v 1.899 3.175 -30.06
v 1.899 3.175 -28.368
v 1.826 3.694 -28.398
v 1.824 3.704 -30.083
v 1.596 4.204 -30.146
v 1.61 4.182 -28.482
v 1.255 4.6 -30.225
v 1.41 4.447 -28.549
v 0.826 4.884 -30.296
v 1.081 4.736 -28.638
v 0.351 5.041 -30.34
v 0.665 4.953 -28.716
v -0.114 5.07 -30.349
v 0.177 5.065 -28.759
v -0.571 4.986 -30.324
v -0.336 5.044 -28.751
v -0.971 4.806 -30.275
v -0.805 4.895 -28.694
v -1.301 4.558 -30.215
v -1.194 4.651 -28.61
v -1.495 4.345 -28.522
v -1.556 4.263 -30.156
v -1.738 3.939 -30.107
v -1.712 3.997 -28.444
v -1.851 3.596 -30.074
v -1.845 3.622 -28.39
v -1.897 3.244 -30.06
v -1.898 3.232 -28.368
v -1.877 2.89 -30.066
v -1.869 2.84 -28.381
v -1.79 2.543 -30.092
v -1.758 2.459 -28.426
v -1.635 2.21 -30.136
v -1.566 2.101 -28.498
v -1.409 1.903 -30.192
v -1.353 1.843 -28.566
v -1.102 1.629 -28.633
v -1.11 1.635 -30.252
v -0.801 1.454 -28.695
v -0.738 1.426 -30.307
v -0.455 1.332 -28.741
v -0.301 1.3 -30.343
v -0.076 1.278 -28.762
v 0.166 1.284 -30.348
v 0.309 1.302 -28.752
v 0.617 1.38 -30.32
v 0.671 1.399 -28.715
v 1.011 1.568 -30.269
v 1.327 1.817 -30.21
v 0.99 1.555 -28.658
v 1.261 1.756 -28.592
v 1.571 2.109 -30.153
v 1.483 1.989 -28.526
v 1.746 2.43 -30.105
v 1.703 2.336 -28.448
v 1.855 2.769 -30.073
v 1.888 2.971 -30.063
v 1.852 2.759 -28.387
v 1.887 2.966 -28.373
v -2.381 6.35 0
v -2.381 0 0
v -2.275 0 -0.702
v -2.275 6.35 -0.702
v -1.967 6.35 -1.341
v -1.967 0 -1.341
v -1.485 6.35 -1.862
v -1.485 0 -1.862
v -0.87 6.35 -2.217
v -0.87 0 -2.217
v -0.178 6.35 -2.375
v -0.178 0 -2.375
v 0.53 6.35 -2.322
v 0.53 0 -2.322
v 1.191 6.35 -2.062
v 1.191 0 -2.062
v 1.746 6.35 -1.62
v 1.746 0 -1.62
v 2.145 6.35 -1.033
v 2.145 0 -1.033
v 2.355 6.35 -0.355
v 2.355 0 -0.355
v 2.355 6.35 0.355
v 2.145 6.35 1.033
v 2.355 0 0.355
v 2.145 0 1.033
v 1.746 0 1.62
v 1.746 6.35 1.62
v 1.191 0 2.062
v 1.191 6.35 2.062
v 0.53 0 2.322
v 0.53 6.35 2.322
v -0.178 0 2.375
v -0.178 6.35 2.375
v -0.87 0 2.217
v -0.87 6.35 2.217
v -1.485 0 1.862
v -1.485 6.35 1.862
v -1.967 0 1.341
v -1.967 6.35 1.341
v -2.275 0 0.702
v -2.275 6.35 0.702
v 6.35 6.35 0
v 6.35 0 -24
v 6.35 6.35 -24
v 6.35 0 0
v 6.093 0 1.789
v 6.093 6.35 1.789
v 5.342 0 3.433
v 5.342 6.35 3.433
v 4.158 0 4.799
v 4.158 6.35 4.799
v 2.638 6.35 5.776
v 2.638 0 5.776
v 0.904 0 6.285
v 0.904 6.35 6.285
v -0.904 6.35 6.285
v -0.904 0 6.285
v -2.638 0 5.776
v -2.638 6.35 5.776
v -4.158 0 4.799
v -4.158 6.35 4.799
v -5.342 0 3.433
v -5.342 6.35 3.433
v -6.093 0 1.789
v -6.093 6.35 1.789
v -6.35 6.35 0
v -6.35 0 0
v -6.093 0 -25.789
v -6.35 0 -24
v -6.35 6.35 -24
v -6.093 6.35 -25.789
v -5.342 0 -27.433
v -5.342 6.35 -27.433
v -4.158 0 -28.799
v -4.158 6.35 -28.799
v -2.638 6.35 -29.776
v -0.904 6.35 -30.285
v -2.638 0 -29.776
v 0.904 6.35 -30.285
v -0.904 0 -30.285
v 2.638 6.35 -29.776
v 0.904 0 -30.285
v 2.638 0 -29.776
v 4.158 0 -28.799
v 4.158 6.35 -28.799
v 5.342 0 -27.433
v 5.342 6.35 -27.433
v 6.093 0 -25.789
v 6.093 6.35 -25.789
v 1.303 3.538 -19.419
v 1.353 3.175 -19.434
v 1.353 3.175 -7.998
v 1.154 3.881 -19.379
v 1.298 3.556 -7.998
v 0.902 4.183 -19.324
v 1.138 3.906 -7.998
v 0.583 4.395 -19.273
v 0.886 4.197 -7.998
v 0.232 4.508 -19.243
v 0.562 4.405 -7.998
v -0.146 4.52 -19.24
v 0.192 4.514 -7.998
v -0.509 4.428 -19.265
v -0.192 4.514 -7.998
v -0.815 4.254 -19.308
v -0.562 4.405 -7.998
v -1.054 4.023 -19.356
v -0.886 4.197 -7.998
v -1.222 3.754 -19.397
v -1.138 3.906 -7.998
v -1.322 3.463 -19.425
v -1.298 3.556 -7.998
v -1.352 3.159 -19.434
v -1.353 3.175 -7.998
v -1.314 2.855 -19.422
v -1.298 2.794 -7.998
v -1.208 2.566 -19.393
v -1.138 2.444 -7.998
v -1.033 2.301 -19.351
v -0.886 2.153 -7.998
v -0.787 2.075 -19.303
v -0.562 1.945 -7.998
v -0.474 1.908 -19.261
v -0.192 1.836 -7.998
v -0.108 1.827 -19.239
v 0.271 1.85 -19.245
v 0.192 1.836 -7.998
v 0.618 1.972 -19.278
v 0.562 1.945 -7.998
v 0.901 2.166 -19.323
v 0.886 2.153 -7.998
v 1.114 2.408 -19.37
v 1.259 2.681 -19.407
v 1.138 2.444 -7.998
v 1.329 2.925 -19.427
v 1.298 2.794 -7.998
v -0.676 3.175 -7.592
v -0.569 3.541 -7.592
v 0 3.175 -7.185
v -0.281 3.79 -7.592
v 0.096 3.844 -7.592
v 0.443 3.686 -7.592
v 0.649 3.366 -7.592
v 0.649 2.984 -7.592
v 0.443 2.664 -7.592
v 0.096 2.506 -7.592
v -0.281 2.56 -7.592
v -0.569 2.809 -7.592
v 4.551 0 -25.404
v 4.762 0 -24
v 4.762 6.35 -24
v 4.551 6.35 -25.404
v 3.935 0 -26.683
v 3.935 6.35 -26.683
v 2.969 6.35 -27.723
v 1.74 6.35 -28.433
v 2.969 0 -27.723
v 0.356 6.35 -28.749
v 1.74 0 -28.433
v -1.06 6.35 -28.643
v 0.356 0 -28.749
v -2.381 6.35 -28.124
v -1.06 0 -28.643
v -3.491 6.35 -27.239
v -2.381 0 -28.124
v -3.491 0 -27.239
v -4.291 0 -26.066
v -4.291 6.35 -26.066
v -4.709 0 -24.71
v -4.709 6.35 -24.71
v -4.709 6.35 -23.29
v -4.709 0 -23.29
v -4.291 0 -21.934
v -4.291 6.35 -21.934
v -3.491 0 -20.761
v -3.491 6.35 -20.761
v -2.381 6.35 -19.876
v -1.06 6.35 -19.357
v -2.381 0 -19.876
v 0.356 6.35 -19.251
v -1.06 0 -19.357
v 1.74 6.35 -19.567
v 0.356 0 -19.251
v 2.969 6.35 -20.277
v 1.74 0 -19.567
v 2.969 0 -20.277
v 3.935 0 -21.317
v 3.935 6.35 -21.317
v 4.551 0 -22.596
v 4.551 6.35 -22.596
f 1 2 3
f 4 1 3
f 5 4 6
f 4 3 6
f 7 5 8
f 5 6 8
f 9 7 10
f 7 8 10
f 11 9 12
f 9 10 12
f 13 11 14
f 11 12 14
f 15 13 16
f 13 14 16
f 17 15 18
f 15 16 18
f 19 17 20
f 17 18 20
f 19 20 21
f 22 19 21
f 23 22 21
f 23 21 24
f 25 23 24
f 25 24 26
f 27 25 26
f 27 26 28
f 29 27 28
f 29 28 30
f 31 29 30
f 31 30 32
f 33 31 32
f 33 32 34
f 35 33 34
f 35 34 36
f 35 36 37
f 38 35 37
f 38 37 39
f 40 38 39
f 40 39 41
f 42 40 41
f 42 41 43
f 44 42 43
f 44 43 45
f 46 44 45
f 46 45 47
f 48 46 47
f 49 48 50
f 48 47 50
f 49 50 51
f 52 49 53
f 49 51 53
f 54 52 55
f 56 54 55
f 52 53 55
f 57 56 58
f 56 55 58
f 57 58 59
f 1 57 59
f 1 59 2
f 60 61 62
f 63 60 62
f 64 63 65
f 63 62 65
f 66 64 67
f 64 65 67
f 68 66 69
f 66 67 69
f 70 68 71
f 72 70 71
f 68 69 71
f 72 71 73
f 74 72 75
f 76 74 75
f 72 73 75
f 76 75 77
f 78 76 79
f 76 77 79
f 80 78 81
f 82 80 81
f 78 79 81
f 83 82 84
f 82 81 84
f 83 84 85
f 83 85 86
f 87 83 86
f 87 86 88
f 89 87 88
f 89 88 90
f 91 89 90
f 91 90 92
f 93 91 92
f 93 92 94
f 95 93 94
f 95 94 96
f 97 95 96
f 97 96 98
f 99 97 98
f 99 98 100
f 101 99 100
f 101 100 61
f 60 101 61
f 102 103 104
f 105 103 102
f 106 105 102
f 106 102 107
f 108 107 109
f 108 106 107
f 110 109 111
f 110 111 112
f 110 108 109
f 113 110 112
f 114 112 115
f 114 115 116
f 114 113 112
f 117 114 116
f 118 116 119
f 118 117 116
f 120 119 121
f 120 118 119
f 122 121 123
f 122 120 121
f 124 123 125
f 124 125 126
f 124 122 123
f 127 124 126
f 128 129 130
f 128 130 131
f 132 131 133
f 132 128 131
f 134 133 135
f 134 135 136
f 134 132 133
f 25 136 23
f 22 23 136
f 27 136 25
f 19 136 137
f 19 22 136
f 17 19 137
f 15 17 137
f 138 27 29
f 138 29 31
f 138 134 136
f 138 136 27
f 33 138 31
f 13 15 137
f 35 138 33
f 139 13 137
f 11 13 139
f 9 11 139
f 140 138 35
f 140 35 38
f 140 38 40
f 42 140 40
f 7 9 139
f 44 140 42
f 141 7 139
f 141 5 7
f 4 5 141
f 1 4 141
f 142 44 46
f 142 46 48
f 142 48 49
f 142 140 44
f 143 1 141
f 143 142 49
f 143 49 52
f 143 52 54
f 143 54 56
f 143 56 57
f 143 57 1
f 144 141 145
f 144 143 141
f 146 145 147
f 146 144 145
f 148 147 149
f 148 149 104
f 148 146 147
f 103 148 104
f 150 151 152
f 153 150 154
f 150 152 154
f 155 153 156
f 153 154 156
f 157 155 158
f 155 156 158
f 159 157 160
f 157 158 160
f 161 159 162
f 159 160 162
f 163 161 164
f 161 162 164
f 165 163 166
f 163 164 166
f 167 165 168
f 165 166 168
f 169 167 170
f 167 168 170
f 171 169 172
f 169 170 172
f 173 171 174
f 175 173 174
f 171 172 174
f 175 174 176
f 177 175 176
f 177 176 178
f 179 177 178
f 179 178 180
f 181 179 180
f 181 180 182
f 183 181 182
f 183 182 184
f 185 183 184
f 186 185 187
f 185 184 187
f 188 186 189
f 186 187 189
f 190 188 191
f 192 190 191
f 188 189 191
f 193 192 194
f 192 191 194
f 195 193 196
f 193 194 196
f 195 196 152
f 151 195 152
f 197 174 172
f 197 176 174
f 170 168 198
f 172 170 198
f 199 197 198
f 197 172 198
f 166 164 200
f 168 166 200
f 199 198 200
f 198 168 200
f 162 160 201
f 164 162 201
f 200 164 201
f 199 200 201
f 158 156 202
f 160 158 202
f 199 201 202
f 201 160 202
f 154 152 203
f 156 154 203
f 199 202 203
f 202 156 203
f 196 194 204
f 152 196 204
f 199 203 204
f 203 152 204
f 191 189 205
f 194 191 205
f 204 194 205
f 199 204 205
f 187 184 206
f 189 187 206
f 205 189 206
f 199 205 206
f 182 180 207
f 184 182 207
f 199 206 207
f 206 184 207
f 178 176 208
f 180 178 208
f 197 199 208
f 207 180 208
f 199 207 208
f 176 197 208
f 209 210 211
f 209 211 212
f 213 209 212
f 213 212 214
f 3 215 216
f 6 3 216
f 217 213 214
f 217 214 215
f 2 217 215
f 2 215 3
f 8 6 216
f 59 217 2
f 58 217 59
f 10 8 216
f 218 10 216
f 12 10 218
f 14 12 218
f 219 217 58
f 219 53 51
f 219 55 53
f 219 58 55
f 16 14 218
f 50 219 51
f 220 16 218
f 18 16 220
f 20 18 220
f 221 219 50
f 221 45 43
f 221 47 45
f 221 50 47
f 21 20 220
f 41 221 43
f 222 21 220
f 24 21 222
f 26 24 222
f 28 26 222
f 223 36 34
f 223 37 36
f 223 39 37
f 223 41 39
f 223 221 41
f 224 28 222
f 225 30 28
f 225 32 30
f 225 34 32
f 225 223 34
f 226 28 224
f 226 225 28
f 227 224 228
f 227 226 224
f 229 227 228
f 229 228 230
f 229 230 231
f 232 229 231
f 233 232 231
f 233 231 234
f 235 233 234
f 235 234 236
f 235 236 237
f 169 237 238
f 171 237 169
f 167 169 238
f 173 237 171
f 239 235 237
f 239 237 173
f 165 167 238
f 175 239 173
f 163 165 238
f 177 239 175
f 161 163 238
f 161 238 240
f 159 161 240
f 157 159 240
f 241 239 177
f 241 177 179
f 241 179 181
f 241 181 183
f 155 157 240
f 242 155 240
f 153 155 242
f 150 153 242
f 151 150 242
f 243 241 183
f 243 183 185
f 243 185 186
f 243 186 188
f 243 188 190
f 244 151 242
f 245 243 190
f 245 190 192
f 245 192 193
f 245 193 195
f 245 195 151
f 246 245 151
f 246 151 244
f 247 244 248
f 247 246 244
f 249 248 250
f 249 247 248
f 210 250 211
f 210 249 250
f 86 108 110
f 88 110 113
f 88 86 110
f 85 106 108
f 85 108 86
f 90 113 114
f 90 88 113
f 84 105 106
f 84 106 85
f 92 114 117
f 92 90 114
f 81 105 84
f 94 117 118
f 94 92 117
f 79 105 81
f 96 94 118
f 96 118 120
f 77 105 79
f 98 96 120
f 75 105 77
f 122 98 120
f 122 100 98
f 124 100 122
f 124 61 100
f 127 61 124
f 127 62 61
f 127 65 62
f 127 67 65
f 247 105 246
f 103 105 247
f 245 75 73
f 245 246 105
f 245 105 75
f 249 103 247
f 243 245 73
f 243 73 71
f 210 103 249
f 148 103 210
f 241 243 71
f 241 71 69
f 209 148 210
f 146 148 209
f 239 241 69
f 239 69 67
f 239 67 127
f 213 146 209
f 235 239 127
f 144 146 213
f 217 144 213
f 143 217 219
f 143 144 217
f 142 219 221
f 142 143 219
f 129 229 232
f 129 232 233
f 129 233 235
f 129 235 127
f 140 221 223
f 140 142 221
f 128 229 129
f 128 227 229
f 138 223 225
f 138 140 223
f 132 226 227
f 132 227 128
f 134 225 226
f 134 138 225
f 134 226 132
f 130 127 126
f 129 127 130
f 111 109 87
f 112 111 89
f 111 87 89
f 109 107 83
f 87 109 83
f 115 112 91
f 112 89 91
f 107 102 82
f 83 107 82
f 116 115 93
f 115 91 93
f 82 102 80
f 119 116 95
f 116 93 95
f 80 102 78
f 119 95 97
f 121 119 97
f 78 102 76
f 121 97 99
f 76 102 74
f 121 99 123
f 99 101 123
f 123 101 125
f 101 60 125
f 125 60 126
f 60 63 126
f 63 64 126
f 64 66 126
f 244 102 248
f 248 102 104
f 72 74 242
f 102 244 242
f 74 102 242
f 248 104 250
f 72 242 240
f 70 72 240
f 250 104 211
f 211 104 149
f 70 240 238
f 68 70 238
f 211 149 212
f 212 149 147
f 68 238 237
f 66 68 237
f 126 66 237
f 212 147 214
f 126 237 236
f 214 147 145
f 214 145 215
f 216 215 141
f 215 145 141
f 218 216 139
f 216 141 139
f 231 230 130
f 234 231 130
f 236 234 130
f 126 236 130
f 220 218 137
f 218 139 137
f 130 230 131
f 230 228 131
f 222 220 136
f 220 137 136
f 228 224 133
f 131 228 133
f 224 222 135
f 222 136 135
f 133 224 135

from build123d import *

# Parameters (mm, degrees)
SKETCH1_R                      = 4.7625
BOSS_EXTRUDE1_DEPTH            = 6.35
F_3_16_0_1875_DIAMETER_HOLE1_D = 4.7625
F_6_32_TAPPED_HOLE1_D          = 2.7051
F_6_32_TAPPED_HOLE1_DEPTH      = 22.352
F_6_32_TAPPED_HOLE1_TIP        = 0.81269403
F_6_CLEARANCE_HOLE1_D          = 3.7973
F_6_CLEARANCE_HOLE1_DEPTH      = 6.35
F_6_CLEARANCE_HOLE1_TIP        = 1.140824014


with BuildPart() as part:
    # Sketch1 → Boss-Extrude1 (new body)
    with BuildSketch(Plane(origin=(0, 0, 0), x_dir=(1, 0, 0), z_dir=(0, 1, 0))):
        with BuildLine():
            Line((6.35, 24), (6.35, 0))
            ThreePointArc((6.35, 0), (0, -6.35), (-6.35, 0))
            Line((-6.35, 0), (-6.35, 24))
            ThreePointArc((-6.35, 24), (0, 30.35), (6.35, 24))
        make_face()
        with Locations((0, 24)):
            Circle(SKETCH1_R, mode=Mode.SUBTRACT)
    extrude(amount=BOSS_EXTRUDE1_DEPTH)

    # 3/16 (0.1875) Diameter Hole1 (through all)
    with Locations(Plane(origin=(0, 6.35, 0), x_dir=(1, 0, 0), z_dir=(0, 1, 0))):
        with Locations((0, 0)):
            Hole(F_3_16_0_1875_DIAMETER_HOLE1_D / 2)

    # #6-32 Tapped Hole1
    with Locations(Plane(origin=(0, 0, -30.35), x_dir=(-1, 0, 0), z_dir=(0, 0, -1))):
        with Locations((0, 3.175)):
            Hole(F_6_32_TAPPED_HOLE1_D / 2, depth=F_6_32_TAPPED_HOLE1_DEPTH)
            with Locations((0, 0, -(F_6_32_TAPPED_HOLE1_DEPTH + F_6_32_TAPPED_HOLE1_TIP / 2))):  # 118° drill point
                Cone(0, F_6_32_TAPPED_HOLE1_D / 2, F_6_32_TAPPED_HOLE1_TIP, mode=Mode.SUBTRACT)

    # #6 Clearance Hole1
    with Locations(Plane(origin=(0, 0, -30.35), x_dir=(-1, 0, 0), z_dir=(0, 0, -1))):
        with Locations((0, 3.175)):
            Hole(F_6_CLEARANCE_HOLE1_D / 2, depth=F_6_CLEARANCE_HOLE1_DEPTH)
            with Locations((0, 0, -(F_6_CLEARANCE_HOLE1_DEPTH + F_6_CLEARANCE_HOLE1_TIP / 2))):  # 118° drill point
                Cone(0, F_6_CLEARANCE_HOLE1_D / 2, F_6_CLEARANCE_HOLE1_TIP, mode=Mode.SUBTRACT)


solid = part.part
